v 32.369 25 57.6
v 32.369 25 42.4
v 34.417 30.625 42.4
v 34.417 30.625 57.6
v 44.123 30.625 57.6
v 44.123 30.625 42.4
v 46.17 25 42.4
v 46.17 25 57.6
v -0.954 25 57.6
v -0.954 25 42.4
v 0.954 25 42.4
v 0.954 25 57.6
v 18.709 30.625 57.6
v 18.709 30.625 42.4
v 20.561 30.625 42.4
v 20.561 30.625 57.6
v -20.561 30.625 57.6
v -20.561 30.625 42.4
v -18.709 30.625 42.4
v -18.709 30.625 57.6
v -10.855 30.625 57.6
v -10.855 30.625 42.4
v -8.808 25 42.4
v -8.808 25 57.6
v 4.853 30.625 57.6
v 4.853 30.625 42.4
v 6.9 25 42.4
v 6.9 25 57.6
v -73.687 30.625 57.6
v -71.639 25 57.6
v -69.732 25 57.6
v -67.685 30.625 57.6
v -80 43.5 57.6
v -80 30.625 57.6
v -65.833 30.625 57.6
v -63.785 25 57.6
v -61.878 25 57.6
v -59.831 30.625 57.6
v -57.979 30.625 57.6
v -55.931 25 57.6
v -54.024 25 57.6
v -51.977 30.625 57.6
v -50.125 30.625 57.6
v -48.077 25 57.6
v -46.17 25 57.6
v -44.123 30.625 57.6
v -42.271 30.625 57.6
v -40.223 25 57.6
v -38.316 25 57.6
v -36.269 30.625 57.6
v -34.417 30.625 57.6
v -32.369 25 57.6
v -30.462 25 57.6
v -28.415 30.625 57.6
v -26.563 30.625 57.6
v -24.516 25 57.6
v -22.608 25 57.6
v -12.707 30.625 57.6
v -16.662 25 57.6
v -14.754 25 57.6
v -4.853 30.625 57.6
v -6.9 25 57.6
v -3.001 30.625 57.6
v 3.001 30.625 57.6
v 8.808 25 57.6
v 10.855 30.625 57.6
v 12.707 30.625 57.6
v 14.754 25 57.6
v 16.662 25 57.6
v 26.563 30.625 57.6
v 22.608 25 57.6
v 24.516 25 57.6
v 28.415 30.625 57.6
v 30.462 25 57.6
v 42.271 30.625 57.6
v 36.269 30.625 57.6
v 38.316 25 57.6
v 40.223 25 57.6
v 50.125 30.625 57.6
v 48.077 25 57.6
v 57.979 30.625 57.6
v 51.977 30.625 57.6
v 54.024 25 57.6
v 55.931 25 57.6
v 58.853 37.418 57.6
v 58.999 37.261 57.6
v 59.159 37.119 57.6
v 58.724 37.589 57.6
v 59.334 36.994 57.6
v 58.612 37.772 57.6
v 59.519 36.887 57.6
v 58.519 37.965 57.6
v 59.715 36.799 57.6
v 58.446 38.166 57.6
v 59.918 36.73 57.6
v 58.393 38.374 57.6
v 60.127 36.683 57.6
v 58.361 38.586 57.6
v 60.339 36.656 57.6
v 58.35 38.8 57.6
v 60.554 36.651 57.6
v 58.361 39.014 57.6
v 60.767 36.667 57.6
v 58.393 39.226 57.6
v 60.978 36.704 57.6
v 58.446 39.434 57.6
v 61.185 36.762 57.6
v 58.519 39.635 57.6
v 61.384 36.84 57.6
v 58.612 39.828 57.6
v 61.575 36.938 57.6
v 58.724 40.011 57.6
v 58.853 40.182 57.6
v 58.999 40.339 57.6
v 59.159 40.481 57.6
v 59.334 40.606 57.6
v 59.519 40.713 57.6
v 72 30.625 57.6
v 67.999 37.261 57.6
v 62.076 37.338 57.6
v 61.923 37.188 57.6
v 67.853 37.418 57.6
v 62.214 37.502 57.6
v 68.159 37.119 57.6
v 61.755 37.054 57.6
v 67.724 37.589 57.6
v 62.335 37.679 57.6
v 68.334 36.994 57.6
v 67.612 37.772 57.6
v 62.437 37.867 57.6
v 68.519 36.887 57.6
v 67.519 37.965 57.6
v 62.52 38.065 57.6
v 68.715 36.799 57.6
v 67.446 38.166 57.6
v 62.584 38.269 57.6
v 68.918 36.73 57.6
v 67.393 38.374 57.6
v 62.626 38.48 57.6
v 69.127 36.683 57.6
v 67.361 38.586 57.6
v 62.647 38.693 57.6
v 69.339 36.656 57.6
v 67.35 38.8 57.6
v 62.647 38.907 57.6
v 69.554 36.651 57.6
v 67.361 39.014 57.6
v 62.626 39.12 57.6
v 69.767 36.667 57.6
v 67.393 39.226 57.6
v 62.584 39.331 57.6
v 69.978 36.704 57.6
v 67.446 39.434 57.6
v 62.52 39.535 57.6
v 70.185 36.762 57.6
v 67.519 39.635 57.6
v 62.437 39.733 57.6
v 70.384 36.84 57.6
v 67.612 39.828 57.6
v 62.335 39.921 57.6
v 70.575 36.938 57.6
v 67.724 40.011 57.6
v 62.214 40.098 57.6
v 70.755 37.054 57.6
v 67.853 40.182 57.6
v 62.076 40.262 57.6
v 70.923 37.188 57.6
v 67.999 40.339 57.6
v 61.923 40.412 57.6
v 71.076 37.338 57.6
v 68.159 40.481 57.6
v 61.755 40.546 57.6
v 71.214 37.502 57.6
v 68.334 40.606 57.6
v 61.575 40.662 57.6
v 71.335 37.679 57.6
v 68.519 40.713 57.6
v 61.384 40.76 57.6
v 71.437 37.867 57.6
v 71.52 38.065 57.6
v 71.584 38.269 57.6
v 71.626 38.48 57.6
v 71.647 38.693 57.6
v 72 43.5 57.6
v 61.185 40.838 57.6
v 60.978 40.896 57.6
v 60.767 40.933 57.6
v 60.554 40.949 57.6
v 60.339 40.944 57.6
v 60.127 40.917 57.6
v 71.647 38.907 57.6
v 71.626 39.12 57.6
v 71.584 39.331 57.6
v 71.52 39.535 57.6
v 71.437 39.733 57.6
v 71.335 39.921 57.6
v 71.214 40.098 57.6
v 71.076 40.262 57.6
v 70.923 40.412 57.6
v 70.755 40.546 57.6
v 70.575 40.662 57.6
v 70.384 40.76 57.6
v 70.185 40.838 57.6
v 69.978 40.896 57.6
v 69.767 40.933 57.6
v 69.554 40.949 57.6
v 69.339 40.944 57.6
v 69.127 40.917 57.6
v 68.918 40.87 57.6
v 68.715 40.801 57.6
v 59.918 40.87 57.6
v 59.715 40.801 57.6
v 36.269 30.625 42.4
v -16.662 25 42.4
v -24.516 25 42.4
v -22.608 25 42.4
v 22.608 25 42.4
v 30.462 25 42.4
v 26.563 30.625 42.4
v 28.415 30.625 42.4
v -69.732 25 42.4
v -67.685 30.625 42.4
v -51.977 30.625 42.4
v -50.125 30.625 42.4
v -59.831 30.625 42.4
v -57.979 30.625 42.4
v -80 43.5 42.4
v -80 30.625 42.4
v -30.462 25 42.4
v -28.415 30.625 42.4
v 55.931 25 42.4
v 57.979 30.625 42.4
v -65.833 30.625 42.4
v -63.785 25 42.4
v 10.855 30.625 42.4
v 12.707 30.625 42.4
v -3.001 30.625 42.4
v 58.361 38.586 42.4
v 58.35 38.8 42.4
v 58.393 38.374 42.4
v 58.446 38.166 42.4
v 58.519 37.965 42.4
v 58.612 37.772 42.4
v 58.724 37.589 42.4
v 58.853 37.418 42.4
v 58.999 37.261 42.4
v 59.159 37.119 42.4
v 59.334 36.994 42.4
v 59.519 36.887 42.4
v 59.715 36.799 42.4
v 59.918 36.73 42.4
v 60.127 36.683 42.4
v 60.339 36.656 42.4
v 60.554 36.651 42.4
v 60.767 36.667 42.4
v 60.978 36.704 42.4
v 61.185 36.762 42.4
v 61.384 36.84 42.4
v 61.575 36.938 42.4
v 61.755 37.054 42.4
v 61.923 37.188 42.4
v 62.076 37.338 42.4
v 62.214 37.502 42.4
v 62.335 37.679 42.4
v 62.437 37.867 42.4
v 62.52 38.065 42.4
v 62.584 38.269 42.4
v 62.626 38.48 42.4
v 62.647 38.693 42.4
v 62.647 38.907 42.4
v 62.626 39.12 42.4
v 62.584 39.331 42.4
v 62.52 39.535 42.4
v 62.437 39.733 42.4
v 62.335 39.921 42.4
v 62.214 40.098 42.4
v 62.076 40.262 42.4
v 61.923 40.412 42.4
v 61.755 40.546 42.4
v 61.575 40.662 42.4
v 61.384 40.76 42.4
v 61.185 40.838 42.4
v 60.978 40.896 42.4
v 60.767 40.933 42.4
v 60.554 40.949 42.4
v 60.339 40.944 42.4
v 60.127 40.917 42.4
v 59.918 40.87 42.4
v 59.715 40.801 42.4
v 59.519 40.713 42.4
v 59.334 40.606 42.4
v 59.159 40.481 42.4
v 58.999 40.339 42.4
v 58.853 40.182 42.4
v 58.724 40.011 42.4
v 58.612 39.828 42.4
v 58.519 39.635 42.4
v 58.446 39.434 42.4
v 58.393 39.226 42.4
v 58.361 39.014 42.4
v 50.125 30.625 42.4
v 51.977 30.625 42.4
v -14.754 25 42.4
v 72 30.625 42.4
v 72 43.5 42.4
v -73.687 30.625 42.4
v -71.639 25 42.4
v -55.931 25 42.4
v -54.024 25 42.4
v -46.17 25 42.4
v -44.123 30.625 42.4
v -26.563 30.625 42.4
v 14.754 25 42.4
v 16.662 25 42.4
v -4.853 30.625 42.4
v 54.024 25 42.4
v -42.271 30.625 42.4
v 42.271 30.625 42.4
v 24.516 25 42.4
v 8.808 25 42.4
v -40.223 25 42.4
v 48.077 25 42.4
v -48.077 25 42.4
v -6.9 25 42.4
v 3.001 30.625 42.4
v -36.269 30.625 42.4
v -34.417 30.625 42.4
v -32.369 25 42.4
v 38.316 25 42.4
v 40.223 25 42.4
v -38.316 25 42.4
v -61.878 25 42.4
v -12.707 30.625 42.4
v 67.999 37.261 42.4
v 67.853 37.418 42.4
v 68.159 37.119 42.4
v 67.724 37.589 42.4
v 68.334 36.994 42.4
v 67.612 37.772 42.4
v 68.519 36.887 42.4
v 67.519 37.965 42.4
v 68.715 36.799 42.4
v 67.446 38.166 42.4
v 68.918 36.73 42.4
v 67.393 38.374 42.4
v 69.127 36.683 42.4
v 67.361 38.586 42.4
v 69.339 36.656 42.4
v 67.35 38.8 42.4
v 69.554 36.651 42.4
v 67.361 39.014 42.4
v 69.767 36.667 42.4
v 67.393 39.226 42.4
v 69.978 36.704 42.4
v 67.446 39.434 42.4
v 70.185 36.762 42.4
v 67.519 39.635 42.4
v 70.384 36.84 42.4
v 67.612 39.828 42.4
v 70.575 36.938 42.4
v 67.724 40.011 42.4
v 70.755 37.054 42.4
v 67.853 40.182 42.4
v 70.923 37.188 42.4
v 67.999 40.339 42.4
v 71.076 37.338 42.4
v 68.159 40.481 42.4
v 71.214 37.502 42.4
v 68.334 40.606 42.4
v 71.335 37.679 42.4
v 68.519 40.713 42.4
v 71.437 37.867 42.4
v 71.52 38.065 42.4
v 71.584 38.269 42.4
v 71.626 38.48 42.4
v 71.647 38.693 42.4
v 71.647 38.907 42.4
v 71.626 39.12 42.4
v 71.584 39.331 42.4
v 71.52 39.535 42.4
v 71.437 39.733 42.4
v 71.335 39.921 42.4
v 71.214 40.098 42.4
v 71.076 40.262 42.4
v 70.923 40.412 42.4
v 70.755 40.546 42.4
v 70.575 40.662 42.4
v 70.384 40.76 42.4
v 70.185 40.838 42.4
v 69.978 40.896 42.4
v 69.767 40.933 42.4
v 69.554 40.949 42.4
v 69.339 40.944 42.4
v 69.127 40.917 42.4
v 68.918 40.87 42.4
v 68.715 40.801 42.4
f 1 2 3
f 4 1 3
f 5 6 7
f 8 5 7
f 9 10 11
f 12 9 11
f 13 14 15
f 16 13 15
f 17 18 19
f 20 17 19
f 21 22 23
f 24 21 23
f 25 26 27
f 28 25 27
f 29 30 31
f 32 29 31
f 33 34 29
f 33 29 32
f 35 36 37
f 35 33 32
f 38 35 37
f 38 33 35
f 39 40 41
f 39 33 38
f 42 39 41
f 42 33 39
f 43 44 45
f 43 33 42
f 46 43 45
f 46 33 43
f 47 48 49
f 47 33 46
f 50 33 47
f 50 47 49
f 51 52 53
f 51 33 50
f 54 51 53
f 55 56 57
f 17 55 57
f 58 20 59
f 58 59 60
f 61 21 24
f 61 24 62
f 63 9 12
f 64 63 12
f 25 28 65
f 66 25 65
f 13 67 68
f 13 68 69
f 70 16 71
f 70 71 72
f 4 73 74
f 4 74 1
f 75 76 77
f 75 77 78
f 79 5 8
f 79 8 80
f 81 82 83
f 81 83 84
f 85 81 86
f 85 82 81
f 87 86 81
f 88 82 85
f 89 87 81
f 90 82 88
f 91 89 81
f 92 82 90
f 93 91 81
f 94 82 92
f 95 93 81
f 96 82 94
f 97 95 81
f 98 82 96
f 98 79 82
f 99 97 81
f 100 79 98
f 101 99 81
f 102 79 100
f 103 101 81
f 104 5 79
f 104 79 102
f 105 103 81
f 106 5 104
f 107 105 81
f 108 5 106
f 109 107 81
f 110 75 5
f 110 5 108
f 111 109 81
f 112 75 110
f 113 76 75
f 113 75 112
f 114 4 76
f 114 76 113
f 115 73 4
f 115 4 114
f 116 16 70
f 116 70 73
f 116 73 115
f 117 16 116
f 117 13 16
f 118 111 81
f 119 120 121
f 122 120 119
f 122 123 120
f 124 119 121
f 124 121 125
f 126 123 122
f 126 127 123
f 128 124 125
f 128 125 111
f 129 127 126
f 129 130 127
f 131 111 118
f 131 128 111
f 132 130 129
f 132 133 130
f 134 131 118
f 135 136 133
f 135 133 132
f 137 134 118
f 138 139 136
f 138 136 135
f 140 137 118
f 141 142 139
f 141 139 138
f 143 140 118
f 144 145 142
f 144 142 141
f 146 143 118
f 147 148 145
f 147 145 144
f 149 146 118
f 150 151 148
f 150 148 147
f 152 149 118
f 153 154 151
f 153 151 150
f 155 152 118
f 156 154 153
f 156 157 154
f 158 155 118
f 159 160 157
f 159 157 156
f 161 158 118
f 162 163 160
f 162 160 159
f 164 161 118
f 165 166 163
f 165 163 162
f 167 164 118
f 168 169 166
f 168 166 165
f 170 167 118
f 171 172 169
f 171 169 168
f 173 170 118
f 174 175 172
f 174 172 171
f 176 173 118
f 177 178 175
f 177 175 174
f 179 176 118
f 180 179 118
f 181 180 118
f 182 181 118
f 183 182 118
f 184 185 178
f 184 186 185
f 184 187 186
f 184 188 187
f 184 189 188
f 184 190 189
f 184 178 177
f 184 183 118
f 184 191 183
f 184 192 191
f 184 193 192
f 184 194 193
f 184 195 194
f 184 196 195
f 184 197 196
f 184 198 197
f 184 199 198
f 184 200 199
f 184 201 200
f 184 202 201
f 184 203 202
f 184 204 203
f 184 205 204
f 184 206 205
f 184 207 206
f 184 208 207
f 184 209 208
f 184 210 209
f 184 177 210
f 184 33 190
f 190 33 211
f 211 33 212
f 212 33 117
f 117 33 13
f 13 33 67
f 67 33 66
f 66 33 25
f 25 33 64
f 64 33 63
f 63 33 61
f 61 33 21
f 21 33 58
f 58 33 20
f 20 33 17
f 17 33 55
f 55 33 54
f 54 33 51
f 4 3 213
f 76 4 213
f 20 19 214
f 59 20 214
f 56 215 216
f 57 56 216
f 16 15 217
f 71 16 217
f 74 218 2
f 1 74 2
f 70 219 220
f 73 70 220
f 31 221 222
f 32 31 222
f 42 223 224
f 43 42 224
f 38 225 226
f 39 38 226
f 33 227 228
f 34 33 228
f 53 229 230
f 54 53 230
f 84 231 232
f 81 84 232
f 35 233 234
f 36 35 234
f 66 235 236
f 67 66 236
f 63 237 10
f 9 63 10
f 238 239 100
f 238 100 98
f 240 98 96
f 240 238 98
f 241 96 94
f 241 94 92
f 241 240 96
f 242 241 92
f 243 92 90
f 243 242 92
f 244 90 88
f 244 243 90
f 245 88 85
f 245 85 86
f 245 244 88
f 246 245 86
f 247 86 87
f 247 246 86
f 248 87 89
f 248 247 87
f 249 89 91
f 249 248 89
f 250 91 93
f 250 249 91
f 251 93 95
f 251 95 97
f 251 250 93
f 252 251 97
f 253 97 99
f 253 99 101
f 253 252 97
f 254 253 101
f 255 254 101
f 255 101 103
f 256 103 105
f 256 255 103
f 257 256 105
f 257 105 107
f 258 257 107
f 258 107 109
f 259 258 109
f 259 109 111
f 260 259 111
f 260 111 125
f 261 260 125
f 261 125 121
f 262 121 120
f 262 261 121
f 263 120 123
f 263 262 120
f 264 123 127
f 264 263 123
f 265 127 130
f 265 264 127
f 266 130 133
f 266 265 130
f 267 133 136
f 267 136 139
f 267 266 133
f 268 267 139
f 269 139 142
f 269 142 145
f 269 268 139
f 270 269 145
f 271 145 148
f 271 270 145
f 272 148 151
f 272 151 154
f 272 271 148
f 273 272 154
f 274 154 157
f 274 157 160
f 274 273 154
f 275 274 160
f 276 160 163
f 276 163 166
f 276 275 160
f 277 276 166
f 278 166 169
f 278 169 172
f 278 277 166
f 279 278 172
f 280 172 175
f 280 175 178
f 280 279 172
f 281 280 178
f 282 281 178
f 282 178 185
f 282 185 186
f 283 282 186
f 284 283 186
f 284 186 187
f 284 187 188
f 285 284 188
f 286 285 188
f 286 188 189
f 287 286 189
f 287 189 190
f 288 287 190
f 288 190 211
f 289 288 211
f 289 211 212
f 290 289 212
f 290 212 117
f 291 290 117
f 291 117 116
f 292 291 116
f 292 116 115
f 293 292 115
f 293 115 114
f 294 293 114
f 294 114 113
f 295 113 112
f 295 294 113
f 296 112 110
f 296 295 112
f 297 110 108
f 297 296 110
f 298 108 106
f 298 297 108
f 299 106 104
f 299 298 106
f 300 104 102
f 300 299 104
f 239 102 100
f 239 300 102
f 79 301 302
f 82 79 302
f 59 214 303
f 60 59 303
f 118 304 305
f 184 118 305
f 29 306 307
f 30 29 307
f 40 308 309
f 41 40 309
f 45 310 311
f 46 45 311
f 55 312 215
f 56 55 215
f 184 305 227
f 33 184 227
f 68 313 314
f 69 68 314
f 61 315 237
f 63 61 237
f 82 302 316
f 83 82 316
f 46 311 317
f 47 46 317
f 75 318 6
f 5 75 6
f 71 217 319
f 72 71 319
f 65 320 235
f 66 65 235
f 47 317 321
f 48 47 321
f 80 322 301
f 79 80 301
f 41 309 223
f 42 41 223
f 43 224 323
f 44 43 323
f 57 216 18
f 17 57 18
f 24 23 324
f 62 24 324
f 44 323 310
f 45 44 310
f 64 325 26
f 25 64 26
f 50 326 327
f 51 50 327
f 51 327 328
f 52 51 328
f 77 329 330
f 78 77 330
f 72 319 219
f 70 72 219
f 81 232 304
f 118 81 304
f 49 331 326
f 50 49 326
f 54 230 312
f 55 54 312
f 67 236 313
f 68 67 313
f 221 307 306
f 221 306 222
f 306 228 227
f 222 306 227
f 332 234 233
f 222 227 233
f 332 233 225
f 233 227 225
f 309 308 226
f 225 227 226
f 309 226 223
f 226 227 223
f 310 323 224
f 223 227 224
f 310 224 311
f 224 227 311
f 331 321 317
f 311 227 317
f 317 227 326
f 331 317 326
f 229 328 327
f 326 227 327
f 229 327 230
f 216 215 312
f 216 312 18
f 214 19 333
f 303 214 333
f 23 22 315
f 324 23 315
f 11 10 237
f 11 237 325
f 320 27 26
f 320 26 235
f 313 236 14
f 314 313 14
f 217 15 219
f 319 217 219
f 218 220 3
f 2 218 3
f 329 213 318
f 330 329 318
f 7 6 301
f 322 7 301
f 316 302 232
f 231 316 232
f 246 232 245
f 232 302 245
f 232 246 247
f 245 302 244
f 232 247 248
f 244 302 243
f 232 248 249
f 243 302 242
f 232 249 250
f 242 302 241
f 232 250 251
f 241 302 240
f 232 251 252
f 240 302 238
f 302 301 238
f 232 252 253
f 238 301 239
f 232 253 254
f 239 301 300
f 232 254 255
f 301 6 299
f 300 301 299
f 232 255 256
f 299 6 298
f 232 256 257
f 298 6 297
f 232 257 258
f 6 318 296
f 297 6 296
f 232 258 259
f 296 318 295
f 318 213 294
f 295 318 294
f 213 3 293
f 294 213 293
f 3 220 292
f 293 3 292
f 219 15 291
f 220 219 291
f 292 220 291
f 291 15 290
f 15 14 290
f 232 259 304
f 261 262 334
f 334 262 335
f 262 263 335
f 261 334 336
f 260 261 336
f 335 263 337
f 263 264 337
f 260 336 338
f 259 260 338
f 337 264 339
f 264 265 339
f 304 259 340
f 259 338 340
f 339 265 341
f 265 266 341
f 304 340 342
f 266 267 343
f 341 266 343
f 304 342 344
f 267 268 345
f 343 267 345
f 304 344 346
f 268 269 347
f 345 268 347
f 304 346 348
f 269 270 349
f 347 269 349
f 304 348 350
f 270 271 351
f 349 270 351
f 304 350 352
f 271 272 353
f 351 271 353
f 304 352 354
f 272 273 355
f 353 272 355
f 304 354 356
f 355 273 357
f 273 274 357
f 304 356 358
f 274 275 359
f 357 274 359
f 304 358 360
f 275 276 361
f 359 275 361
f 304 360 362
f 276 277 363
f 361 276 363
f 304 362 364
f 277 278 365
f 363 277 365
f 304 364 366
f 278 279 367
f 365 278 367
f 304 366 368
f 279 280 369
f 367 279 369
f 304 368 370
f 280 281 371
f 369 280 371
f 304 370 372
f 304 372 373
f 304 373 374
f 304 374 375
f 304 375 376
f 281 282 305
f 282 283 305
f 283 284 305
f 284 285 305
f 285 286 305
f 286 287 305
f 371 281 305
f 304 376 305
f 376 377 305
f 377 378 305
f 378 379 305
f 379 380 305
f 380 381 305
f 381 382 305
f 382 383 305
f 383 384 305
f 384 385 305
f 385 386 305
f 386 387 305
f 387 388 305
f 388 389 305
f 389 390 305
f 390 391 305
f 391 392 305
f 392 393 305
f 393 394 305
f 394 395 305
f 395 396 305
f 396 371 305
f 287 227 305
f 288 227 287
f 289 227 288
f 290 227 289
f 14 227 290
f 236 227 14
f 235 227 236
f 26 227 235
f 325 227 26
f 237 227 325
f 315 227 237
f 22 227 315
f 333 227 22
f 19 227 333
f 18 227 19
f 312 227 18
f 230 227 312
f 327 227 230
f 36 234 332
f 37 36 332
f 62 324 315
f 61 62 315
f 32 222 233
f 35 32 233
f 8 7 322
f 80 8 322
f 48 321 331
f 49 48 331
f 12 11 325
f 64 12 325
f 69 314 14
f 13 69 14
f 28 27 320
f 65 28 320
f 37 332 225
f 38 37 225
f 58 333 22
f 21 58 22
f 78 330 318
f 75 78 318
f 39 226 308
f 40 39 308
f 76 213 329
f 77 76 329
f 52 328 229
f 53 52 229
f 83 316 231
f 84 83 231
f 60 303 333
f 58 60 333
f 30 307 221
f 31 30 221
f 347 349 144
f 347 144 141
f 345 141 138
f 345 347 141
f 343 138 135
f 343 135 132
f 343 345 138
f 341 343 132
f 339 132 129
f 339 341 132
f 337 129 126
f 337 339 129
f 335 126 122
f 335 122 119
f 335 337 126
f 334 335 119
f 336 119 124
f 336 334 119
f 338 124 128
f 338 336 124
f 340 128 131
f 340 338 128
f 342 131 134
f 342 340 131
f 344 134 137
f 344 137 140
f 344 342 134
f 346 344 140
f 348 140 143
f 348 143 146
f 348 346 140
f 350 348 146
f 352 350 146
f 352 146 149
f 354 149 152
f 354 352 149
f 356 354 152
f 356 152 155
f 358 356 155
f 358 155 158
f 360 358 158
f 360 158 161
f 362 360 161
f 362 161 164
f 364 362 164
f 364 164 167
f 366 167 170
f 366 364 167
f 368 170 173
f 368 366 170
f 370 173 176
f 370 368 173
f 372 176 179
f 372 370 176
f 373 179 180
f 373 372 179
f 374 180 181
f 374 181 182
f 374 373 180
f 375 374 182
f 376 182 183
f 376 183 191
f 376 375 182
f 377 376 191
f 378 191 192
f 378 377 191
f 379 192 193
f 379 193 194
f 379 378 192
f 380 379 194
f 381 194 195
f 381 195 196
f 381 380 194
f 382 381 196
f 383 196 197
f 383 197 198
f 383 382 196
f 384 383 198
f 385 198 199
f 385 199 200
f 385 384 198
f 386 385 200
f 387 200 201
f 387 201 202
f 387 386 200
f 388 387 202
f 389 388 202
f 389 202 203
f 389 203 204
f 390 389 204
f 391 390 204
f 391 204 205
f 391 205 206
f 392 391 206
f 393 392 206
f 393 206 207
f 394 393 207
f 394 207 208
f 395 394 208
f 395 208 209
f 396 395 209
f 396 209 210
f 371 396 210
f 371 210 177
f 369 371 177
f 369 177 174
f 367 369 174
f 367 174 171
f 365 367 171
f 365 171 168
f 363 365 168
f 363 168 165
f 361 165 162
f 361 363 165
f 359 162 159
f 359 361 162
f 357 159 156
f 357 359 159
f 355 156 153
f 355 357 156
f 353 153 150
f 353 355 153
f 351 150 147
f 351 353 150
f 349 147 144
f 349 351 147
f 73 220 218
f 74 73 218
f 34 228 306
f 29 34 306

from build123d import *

# Parameters (mm, degrees)
F_17_START                                     = 42.4
F_17_RACK_TEETH_MODULE_2_5_AND_20_DEGREE_DEPTH = 15.2
TWO_START                                      = 42.4
SKETCH2_R                                      = 2.15
TWO_CROSSHEAD_JOINT_THROUGH_HOLES_DEPTH        = 15.2


with BuildPart() as part:
    # Sketch1 → 17 rack teeth - module 2.5 and 20 degrees (new body)
    with BuildSketch(Plane.XY.offset(F_17_START)):
        Polygon((-80, 43.5), (-80, 30.625), (-73.686737096, 30.625), (-71.639404529, 25), (-69.732264883, 25), (-67.684932315, 30.625), (-65.832755462, 30.625), (-63.785422895, 25), (-61.878283249, 25), (-59.830950681, 30.625), (-57.978773828, 30.625), (-55.931441261, 25), (-54.024301615, 25), (-51.976969047, 30.625), (-50.124792194, 30.625), (-48.077459627, 25), (-46.170319981, 25), (-44.122987413, 30.625), (-42.27081056, 30.625), (-40.223477993, 25), (-38.316338347, 25), (-36.269005779, 30.625), (-34.416828926, 30.625), (-32.369496359, 25), (-30.462356713, 25), (-28.415024145, 30.625), (-26.562847292, 30.625), (-24.515514725, 25), (-22.608375079, 25), (-20.561042511, 30.625), (-18.708865659, 30.625), (-16.661533091, 25), (-14.754393445, 25), (-12.707060877, 30.625), (-10.854884025, 30.625), (-8.807551457, 25), (-6.900411811, 25), (-4.853079243, 30.625), (-3.000902391, 30.625), (-0.953569823, 25), (0.953569823, 25), (3.000902391, 30.625), (4.853079243, 30.625), (6.900411811, 25), (8.807551457, 25), (10.854884025, 30.625), (12.707060877, 30.625), (14.754393445, 25), (16.661533091, 25), (18.708865659, 30.625), (20.561042511, 30.625), (22.608375079, 25), (24.515514725, 25), (26.562847292, 30.625), (28.415024145, 30.625), (30.462356713, 25), (32.369496359, 25), (34.416828926, 30.625), (36.269005779, 30.625), (38.316338347, 25), (40.223477993, 25), (42.27081056, 30.625), (44.122987413, 30.625), (46.170319981, 25), (48.077459627, 25), (50.124792194, 30.625), (51.976969047, 30.625), (54.024301615, 25), (55.931441261, 25), (57.978773828, 30.625), (72, 30.625), (72, 43.5), align=None)
    extrude(amount=F_17_RACK_TEETH_MODULE_2_5_AND_20_DEGREE_DEPTH)

    # Sketch2 → Two crosshead joint through holes (cut)
    with BuildSketch(Plane.XY.offset(TWO_START)):
        with Locations(Location((60.5, 38.8, 0), (0, 0, 180))):
            Circle(SKETCH2_R)
        with Locations(Location((69.5, 38.8, 0), (0, 0, 180))):
            Circle(SKETCH2_R)
    extrude(amount=TWO_CROSSHEAD_JOINT_THROUGH_HOLES_DEPTH, mode=Mode.SUBTRACT)


solid = part.part
